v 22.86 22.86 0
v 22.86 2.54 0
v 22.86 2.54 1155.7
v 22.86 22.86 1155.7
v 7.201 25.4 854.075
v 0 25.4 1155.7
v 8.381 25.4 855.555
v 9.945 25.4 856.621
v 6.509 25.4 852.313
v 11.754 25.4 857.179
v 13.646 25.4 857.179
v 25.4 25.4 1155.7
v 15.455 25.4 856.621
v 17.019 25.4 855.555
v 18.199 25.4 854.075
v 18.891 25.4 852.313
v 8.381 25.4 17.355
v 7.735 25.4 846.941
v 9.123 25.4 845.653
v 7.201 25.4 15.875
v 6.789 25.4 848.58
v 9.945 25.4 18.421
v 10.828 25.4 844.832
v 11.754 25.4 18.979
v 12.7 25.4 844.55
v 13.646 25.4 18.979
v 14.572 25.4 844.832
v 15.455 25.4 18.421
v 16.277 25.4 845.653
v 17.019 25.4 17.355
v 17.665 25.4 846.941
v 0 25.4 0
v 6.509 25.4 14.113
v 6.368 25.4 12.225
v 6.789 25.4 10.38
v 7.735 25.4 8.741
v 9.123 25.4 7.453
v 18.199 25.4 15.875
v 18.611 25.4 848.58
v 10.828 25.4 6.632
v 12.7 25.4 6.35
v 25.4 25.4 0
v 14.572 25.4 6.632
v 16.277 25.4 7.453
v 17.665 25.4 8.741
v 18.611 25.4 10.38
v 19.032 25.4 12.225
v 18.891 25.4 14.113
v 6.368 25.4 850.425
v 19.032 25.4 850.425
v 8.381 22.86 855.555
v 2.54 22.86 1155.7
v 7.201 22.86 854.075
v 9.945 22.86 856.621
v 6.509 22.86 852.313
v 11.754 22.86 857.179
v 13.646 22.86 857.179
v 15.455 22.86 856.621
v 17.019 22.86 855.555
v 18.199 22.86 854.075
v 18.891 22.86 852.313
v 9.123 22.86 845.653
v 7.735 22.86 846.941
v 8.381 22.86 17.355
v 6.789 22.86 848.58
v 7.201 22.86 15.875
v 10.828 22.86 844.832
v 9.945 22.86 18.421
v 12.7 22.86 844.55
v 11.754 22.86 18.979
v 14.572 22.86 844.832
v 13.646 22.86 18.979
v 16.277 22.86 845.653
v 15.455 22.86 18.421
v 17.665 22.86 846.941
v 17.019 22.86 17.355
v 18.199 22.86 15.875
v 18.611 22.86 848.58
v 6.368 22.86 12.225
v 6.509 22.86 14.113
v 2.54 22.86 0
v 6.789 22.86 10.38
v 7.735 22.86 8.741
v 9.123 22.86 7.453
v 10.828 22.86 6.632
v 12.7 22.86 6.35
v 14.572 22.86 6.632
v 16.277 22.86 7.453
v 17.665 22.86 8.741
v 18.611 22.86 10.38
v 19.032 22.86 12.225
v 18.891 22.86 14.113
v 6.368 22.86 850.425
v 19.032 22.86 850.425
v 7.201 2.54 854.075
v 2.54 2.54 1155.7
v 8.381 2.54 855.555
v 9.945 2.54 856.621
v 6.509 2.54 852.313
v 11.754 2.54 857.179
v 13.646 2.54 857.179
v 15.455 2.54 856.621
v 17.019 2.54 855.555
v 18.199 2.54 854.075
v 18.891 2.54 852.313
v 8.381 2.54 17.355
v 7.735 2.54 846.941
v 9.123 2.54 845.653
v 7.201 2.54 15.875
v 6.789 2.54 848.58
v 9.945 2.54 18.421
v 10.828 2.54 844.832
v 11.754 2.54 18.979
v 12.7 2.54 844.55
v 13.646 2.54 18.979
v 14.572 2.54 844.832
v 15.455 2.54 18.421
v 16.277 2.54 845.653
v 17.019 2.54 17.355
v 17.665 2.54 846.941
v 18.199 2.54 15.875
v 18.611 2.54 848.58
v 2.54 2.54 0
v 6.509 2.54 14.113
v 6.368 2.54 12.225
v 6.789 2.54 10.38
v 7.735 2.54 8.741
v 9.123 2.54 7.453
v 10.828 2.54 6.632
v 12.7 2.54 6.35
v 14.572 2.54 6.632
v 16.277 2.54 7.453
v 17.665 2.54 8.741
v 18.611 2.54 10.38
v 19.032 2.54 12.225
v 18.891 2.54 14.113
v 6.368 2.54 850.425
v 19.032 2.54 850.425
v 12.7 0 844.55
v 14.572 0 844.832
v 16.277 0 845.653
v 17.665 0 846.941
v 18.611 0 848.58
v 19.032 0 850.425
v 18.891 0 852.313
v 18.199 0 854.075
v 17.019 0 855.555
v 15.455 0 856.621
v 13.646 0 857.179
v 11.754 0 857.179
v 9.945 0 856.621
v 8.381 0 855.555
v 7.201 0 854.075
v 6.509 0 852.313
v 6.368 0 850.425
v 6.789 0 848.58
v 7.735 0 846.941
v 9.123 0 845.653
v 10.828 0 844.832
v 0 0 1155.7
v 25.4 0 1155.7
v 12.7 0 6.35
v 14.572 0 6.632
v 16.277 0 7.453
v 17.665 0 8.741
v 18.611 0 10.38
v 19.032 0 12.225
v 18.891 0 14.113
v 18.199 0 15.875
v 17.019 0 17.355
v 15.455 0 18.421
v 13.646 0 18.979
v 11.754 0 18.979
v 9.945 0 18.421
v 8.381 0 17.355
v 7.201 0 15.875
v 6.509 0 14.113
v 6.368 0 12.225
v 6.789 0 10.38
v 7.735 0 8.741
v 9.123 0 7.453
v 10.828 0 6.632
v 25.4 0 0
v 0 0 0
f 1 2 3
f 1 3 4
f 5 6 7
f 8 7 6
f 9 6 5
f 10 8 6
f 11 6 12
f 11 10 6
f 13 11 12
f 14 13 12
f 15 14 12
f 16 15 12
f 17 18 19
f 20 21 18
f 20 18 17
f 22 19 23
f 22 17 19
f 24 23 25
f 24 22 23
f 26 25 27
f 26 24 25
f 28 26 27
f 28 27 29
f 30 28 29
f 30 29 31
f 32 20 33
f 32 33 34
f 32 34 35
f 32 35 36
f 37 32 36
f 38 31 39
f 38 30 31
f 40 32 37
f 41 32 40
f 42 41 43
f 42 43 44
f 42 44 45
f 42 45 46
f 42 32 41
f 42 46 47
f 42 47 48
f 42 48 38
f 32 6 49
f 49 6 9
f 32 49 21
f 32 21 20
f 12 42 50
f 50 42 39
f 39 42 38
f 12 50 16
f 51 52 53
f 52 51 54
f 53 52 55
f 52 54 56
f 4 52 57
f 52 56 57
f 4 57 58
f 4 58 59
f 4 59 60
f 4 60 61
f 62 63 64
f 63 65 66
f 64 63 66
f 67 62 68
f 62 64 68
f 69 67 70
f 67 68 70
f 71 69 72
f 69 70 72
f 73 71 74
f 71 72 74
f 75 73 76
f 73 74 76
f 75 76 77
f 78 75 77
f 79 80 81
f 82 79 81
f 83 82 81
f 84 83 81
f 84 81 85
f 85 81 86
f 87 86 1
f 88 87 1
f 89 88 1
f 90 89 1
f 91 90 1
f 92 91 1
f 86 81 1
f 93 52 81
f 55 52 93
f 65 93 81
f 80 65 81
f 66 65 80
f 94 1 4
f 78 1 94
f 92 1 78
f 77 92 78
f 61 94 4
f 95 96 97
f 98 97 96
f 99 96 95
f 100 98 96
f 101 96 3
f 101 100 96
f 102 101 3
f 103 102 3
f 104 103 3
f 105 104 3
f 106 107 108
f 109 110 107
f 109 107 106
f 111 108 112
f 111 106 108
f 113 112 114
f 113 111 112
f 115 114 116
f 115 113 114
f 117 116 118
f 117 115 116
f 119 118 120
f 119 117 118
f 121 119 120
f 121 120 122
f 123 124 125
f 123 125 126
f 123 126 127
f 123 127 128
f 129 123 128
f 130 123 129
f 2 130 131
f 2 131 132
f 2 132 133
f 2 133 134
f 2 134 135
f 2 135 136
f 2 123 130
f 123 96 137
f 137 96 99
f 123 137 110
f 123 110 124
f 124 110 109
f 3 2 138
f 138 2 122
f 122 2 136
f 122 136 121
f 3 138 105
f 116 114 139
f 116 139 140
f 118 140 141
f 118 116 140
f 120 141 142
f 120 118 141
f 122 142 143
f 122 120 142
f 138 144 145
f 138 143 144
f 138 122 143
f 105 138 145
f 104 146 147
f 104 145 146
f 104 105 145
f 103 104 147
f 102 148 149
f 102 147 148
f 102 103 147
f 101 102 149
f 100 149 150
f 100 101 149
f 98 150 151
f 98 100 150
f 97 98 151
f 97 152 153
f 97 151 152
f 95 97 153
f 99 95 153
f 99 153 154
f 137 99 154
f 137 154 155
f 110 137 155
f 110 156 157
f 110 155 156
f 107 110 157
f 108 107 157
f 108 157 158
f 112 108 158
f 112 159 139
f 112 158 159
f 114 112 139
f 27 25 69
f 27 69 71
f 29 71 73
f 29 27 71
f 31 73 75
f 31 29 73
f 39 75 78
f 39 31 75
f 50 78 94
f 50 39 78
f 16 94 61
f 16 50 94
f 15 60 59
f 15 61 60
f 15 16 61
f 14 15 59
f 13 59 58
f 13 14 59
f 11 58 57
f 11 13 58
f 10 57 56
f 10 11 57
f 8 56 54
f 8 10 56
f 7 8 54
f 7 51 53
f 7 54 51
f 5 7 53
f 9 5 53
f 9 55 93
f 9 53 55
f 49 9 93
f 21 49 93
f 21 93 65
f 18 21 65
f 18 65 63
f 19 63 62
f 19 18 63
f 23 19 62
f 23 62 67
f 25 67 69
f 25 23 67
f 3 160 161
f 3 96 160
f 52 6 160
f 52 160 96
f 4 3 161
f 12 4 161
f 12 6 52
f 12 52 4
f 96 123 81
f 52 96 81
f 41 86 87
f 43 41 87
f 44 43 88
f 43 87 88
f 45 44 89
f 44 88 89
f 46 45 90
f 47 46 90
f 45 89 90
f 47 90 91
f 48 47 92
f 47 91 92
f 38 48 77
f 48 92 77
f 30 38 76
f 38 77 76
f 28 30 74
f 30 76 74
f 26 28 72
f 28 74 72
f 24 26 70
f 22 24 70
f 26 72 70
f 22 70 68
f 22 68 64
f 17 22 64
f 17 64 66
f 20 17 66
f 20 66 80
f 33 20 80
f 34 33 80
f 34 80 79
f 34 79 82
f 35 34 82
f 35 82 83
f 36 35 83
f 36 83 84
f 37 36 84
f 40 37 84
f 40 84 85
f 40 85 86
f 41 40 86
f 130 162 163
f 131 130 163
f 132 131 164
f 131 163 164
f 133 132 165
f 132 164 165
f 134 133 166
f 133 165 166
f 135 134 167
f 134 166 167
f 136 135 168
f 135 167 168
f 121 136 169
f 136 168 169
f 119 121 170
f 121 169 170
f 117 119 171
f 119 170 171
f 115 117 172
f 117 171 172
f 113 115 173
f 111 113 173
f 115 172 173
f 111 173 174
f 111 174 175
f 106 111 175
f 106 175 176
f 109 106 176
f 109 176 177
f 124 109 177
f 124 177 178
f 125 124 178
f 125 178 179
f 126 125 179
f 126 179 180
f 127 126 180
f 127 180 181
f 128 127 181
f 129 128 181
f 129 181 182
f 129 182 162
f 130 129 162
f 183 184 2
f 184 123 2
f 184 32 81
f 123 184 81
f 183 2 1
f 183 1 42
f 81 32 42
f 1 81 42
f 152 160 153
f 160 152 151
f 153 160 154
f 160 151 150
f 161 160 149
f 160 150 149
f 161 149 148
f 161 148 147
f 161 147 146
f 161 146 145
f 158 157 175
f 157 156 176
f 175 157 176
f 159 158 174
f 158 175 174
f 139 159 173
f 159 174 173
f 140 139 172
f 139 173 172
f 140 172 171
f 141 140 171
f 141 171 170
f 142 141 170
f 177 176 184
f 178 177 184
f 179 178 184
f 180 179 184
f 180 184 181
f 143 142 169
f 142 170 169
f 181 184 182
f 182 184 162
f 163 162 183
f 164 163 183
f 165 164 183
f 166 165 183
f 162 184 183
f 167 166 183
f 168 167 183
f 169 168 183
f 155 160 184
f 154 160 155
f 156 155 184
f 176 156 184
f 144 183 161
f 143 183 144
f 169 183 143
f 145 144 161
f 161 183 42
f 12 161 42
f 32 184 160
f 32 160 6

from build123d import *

# Parameters (mm, degrees)
SKETCH1_W               = 25.4
SKETCH1_H               = 25.4
SKETCH1_W_2             = 20.32
SKETCH1_H_2             = 20.32
BOSS_EXTRUDE1_DEPTH     = 1155.7
SKETCH2_R               = 6.35
CUT_EXTRUDE1_DEPTH      = 1157.258106999
CUT_EXTRUDE2_DEPTH      = 1157.258106999
CUT_EXTRUDE2_DEPTH_BACK = 1157.258106999
SKETCH3_R               = 6.35


with BuildPart() as part:
    # Sketch1 → Boss-Extrude1 (new body)
    with BuildSketch(Plane.XY):
        with Locations((12.7, 12.7)):
            Rectangle(SKETCH1_W, SKETCH1_H)
        with Locations((12.7, 12.7)):
            Rectangle(SKETCH1_W_2, SKETCH1_H_2, mode=Mode.SUBTRACT)
    extrude(amount=BOSS_EXTRUDE1_DEPTH)

    # Sketch2 → Cut-Extrude1 (cut, through all)
    with BuildSketch(Plane.XZ):
        with Locations(Location((12.7, 12.7, 0), (0, 0, 270))):
            Circle(SKETCH2_R)
    extrude(amount=-CUT_EXTRUDE1_DEPTH, mode=Mode.SUBTRACT)

    # Sketch3 → Cut-Extrude2 (cut, two sides: drawn at the far end of the back side and taken through both)
    with BuildSketch(Plane.XZ.offset(-CUT_EXTRUDE2_DEPTH_BACK)):
        with Locations(Location((12.7, 850.9, 0), (0, 0, 270))):
            Circle(SKETCH3_R)
    extrude(amount=CUT_EXTRUDE2_DEPTH + CUT_EXTRUDE2_DEPTH_BACK, mode=Mode.SUBTRACT)


solid = part.part
